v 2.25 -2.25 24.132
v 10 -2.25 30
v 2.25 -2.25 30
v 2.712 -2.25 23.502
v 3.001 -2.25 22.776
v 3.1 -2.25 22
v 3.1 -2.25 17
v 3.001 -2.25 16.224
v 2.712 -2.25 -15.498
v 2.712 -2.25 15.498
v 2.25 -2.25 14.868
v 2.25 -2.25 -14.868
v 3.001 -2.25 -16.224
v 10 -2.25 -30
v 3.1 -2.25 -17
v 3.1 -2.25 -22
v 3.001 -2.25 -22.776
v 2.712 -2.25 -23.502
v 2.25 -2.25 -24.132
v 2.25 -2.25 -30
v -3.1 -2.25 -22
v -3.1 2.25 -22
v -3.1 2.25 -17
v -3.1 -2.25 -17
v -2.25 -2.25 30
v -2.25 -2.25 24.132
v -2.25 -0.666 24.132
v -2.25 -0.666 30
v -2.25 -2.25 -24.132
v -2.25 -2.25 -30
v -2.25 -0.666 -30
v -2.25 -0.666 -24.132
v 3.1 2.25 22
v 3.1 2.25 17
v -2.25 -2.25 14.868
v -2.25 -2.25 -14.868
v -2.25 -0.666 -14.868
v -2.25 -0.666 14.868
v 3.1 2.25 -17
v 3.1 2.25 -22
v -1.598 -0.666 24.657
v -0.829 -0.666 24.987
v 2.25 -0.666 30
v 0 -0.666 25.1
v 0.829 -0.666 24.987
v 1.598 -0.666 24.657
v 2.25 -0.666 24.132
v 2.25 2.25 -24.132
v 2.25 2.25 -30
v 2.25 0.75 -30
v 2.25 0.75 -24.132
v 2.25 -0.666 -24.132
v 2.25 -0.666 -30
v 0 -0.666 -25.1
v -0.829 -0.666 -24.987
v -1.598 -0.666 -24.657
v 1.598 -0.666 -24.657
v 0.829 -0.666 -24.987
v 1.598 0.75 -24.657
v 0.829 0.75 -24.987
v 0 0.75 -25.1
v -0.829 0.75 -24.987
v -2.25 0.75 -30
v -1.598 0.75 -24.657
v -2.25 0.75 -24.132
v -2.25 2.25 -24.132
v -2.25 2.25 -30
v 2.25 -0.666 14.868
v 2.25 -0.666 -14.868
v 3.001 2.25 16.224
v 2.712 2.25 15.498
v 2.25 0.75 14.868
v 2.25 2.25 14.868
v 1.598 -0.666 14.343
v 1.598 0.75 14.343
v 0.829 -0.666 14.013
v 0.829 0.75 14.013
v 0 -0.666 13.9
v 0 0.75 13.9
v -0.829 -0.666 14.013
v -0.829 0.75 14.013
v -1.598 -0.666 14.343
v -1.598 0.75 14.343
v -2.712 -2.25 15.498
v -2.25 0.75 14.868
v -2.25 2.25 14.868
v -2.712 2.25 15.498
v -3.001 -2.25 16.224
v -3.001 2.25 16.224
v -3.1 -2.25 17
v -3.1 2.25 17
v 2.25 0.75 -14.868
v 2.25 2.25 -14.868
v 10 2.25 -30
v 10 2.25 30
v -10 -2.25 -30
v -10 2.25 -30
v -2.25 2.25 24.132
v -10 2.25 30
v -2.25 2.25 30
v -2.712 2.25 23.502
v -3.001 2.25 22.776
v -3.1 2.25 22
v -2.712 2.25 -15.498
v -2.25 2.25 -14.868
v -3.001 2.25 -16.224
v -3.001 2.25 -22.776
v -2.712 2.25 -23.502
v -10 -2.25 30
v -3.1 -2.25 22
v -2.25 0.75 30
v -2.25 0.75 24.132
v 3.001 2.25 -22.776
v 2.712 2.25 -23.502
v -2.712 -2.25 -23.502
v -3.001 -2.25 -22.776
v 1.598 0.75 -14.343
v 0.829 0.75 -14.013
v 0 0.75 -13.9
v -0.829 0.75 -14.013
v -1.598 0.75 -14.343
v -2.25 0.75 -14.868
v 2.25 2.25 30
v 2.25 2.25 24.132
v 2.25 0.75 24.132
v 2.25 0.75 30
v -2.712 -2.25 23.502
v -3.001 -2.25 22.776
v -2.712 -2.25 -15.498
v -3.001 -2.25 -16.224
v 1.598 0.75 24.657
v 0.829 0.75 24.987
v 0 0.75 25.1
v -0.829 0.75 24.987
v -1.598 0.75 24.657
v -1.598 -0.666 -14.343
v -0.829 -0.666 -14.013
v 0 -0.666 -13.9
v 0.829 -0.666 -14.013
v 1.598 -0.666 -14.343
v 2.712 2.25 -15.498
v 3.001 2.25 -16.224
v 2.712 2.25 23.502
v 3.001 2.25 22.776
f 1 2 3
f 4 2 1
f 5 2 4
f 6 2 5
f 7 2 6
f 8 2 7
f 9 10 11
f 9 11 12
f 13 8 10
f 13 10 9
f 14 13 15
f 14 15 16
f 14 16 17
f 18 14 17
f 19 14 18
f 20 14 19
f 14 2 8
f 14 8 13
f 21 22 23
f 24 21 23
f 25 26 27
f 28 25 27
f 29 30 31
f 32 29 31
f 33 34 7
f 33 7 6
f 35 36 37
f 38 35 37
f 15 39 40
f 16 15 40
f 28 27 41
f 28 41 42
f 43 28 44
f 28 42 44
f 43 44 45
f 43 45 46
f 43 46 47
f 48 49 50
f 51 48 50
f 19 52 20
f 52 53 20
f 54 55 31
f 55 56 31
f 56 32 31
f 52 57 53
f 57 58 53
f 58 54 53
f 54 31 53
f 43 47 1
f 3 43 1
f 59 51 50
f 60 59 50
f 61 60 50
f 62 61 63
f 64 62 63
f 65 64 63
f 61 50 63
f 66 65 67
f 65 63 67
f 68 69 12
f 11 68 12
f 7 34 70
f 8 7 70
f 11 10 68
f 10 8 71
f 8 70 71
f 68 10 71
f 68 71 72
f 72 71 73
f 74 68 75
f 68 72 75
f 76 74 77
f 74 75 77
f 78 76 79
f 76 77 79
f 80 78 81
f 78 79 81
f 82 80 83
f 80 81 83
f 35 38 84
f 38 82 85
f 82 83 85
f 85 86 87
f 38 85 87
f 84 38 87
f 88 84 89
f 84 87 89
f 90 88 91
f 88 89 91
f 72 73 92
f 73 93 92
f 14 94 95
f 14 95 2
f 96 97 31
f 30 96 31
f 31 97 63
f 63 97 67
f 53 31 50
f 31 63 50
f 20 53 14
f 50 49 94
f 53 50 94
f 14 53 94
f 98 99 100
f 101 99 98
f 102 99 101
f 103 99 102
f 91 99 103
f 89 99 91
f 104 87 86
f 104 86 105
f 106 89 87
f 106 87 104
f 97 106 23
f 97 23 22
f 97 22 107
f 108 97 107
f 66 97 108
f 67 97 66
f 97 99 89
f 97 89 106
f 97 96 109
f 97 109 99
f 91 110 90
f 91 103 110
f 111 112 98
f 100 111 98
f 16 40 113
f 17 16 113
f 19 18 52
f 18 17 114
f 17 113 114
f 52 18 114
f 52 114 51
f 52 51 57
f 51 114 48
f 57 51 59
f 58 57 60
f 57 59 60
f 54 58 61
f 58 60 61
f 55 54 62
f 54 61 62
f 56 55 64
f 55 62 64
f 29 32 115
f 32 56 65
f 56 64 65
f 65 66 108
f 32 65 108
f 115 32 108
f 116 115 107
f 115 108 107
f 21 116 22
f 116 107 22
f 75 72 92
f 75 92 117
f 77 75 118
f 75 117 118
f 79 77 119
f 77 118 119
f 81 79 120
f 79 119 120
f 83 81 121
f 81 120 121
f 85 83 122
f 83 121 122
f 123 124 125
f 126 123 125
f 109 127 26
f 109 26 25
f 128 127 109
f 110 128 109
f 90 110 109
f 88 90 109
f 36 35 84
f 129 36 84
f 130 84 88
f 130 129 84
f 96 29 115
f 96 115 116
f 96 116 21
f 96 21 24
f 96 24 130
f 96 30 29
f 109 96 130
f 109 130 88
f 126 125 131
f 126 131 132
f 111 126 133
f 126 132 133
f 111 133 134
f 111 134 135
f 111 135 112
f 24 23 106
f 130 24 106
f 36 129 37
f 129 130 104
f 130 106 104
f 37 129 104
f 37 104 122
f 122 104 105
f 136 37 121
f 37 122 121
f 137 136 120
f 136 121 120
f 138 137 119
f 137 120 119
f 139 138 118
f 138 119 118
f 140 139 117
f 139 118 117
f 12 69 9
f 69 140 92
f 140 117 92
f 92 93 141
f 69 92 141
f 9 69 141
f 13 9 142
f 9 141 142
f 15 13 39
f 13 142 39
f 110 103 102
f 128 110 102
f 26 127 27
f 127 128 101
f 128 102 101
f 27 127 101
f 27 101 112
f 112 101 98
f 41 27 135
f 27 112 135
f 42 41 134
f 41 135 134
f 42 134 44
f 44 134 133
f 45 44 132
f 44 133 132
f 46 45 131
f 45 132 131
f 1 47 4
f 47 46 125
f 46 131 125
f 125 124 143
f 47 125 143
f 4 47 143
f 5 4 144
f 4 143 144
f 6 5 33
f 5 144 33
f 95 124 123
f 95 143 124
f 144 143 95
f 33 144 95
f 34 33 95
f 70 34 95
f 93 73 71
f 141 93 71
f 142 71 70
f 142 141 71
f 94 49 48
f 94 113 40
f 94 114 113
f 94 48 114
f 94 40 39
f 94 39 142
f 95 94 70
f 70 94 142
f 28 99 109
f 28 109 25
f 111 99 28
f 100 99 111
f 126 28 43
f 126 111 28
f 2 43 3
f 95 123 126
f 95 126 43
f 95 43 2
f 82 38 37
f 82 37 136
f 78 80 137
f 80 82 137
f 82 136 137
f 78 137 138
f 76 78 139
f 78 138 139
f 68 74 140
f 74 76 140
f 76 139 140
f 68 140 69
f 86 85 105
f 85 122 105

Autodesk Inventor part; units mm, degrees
ref_plane "YZ Plane" through (0, 0, 0) normal (1, 0, 0) x (0, 1, 0)
ref_plane "XZ Plane" through (0, 0, 0) normal (0, 1, 0) x (-1, 0, 0)
ref_plane "XY Plane" through (0, 0, 0) normal (0, 0, 1) x (1, 0, 0)
sketch "Sketch1" plane through (0, 0, 0) normal (0, 0, 1) x (1, 0, 0)
  line L0 (-10, 2.25) -> (10, 2.25)
  line L1 (10, 2.25) -> (10, -2.25)
  line L2 (10, -2.25) -> (-10, -2.25)
  line L3 (-10, -2.25) -> (-10, 2.25)
  line L4 (-10, 2.25) -> (10, -2.25) construction
  line L5 (10, 2.25) -> (-10, -2.25) construction
  line L6 (-2.25, 3.75) -> (2.25, 3.75)
  line L7 (2.25, 3.75) -> (2.25, 0.75)
  line L8 (2.25, 0.75) -> (-2.25, 0.75)
  line L9 (-2.25, 0.75) -> (-2.25, 3.75)
  line L10 (-2.25, 3.75) -> (2.25, 0.75) construction
  line L11 (2.25, 3.75) -> (-2.25, 0.75) construction
  line L12 (-2.25, -0.6661) -> (2.25, -0.6661)
  line L13 (2.25, -0.6661) -> (2.25, -3.8339)
  line L14 (2.25, -3.8339) -> (-2.25, -3.8339)
  line L15 (-2.25, -3.8339) -> (-2.25, -0.6661)
  line L16 (-2.25, -0.6661) -> (2.25, -3.8339) construction
  line L17 (2.25, -0.6661) -> (-2.25, -3.8339) construction
  point P0 (0, 0)
  point P1 (0, 2.25)
  point P2 (0, -2.25)
  point P3 (2.25, 2.25)
  point P4 (-2.25, 2.25)
  point P5 (-2.25, -2.25)
  point P6 (2.25, -2.25)
  dimension "d0" = 20
  dimension "d1" = 4.5
  dimension "d2" = 4.5
  dimension "d3" = 3
extrude "Extrusion1" add sketch "Sketch1" along normal mid plane 60 contours L0 L9 L8 L7 L1 L2 L13 L12 L15 L3
sketch "Sketch2" plane through (2.25, 2.25, 30) normal (0, 1, 0) x (1, 0, 0)
  line L0 (-5.35, 13) -> (0.85, 13)
  line L1 (0.85, 13) -> (0.85, 8)
  line L2 (0.85, 8) -> (-5.35, 8)
  line L3 (-5.35, 8) -> (-5.35, 13)
  line L4 (-5.35, 13) -> (0.85, 8) construction
  line L5 (0.85, 13) -> (-5.35, 8) construction
  line L6 (0, 0) -> (-4.5, 0) projected
  circle A0 centre (-2.25, 8) radius 3.1
  circle A1 centre (-2.25, 13) radius 3.1
  line L7 (7.75, 0) -> (7.75, 60) projected
  line L8 (7.75, 30) -> (-12.25, 30)
  line L9 (-12.25, 60) -> (-12.25, 0) projected
  line L10 (0.85, 47) -> (0.85, 52)
  line L11 (-5.35, 52) -> (-5.35, 47)
  circle A2 centre (-2.25, 52) radius 3.1
  circle A3 centre (-2.25, 47) radius 3.1
  point P0 (-2.25, 30)
  point P1 (-2.25, 10.5)
  point P2 (-2.25, 49.5)
  dimension "d6" = 6.2
  dimension "d7" = 5
  dimension "d8" = 8
extrude "Extrusion2" cut sketch "Sketch2" against normal blind 60
properties part number "Spacer Laser"
